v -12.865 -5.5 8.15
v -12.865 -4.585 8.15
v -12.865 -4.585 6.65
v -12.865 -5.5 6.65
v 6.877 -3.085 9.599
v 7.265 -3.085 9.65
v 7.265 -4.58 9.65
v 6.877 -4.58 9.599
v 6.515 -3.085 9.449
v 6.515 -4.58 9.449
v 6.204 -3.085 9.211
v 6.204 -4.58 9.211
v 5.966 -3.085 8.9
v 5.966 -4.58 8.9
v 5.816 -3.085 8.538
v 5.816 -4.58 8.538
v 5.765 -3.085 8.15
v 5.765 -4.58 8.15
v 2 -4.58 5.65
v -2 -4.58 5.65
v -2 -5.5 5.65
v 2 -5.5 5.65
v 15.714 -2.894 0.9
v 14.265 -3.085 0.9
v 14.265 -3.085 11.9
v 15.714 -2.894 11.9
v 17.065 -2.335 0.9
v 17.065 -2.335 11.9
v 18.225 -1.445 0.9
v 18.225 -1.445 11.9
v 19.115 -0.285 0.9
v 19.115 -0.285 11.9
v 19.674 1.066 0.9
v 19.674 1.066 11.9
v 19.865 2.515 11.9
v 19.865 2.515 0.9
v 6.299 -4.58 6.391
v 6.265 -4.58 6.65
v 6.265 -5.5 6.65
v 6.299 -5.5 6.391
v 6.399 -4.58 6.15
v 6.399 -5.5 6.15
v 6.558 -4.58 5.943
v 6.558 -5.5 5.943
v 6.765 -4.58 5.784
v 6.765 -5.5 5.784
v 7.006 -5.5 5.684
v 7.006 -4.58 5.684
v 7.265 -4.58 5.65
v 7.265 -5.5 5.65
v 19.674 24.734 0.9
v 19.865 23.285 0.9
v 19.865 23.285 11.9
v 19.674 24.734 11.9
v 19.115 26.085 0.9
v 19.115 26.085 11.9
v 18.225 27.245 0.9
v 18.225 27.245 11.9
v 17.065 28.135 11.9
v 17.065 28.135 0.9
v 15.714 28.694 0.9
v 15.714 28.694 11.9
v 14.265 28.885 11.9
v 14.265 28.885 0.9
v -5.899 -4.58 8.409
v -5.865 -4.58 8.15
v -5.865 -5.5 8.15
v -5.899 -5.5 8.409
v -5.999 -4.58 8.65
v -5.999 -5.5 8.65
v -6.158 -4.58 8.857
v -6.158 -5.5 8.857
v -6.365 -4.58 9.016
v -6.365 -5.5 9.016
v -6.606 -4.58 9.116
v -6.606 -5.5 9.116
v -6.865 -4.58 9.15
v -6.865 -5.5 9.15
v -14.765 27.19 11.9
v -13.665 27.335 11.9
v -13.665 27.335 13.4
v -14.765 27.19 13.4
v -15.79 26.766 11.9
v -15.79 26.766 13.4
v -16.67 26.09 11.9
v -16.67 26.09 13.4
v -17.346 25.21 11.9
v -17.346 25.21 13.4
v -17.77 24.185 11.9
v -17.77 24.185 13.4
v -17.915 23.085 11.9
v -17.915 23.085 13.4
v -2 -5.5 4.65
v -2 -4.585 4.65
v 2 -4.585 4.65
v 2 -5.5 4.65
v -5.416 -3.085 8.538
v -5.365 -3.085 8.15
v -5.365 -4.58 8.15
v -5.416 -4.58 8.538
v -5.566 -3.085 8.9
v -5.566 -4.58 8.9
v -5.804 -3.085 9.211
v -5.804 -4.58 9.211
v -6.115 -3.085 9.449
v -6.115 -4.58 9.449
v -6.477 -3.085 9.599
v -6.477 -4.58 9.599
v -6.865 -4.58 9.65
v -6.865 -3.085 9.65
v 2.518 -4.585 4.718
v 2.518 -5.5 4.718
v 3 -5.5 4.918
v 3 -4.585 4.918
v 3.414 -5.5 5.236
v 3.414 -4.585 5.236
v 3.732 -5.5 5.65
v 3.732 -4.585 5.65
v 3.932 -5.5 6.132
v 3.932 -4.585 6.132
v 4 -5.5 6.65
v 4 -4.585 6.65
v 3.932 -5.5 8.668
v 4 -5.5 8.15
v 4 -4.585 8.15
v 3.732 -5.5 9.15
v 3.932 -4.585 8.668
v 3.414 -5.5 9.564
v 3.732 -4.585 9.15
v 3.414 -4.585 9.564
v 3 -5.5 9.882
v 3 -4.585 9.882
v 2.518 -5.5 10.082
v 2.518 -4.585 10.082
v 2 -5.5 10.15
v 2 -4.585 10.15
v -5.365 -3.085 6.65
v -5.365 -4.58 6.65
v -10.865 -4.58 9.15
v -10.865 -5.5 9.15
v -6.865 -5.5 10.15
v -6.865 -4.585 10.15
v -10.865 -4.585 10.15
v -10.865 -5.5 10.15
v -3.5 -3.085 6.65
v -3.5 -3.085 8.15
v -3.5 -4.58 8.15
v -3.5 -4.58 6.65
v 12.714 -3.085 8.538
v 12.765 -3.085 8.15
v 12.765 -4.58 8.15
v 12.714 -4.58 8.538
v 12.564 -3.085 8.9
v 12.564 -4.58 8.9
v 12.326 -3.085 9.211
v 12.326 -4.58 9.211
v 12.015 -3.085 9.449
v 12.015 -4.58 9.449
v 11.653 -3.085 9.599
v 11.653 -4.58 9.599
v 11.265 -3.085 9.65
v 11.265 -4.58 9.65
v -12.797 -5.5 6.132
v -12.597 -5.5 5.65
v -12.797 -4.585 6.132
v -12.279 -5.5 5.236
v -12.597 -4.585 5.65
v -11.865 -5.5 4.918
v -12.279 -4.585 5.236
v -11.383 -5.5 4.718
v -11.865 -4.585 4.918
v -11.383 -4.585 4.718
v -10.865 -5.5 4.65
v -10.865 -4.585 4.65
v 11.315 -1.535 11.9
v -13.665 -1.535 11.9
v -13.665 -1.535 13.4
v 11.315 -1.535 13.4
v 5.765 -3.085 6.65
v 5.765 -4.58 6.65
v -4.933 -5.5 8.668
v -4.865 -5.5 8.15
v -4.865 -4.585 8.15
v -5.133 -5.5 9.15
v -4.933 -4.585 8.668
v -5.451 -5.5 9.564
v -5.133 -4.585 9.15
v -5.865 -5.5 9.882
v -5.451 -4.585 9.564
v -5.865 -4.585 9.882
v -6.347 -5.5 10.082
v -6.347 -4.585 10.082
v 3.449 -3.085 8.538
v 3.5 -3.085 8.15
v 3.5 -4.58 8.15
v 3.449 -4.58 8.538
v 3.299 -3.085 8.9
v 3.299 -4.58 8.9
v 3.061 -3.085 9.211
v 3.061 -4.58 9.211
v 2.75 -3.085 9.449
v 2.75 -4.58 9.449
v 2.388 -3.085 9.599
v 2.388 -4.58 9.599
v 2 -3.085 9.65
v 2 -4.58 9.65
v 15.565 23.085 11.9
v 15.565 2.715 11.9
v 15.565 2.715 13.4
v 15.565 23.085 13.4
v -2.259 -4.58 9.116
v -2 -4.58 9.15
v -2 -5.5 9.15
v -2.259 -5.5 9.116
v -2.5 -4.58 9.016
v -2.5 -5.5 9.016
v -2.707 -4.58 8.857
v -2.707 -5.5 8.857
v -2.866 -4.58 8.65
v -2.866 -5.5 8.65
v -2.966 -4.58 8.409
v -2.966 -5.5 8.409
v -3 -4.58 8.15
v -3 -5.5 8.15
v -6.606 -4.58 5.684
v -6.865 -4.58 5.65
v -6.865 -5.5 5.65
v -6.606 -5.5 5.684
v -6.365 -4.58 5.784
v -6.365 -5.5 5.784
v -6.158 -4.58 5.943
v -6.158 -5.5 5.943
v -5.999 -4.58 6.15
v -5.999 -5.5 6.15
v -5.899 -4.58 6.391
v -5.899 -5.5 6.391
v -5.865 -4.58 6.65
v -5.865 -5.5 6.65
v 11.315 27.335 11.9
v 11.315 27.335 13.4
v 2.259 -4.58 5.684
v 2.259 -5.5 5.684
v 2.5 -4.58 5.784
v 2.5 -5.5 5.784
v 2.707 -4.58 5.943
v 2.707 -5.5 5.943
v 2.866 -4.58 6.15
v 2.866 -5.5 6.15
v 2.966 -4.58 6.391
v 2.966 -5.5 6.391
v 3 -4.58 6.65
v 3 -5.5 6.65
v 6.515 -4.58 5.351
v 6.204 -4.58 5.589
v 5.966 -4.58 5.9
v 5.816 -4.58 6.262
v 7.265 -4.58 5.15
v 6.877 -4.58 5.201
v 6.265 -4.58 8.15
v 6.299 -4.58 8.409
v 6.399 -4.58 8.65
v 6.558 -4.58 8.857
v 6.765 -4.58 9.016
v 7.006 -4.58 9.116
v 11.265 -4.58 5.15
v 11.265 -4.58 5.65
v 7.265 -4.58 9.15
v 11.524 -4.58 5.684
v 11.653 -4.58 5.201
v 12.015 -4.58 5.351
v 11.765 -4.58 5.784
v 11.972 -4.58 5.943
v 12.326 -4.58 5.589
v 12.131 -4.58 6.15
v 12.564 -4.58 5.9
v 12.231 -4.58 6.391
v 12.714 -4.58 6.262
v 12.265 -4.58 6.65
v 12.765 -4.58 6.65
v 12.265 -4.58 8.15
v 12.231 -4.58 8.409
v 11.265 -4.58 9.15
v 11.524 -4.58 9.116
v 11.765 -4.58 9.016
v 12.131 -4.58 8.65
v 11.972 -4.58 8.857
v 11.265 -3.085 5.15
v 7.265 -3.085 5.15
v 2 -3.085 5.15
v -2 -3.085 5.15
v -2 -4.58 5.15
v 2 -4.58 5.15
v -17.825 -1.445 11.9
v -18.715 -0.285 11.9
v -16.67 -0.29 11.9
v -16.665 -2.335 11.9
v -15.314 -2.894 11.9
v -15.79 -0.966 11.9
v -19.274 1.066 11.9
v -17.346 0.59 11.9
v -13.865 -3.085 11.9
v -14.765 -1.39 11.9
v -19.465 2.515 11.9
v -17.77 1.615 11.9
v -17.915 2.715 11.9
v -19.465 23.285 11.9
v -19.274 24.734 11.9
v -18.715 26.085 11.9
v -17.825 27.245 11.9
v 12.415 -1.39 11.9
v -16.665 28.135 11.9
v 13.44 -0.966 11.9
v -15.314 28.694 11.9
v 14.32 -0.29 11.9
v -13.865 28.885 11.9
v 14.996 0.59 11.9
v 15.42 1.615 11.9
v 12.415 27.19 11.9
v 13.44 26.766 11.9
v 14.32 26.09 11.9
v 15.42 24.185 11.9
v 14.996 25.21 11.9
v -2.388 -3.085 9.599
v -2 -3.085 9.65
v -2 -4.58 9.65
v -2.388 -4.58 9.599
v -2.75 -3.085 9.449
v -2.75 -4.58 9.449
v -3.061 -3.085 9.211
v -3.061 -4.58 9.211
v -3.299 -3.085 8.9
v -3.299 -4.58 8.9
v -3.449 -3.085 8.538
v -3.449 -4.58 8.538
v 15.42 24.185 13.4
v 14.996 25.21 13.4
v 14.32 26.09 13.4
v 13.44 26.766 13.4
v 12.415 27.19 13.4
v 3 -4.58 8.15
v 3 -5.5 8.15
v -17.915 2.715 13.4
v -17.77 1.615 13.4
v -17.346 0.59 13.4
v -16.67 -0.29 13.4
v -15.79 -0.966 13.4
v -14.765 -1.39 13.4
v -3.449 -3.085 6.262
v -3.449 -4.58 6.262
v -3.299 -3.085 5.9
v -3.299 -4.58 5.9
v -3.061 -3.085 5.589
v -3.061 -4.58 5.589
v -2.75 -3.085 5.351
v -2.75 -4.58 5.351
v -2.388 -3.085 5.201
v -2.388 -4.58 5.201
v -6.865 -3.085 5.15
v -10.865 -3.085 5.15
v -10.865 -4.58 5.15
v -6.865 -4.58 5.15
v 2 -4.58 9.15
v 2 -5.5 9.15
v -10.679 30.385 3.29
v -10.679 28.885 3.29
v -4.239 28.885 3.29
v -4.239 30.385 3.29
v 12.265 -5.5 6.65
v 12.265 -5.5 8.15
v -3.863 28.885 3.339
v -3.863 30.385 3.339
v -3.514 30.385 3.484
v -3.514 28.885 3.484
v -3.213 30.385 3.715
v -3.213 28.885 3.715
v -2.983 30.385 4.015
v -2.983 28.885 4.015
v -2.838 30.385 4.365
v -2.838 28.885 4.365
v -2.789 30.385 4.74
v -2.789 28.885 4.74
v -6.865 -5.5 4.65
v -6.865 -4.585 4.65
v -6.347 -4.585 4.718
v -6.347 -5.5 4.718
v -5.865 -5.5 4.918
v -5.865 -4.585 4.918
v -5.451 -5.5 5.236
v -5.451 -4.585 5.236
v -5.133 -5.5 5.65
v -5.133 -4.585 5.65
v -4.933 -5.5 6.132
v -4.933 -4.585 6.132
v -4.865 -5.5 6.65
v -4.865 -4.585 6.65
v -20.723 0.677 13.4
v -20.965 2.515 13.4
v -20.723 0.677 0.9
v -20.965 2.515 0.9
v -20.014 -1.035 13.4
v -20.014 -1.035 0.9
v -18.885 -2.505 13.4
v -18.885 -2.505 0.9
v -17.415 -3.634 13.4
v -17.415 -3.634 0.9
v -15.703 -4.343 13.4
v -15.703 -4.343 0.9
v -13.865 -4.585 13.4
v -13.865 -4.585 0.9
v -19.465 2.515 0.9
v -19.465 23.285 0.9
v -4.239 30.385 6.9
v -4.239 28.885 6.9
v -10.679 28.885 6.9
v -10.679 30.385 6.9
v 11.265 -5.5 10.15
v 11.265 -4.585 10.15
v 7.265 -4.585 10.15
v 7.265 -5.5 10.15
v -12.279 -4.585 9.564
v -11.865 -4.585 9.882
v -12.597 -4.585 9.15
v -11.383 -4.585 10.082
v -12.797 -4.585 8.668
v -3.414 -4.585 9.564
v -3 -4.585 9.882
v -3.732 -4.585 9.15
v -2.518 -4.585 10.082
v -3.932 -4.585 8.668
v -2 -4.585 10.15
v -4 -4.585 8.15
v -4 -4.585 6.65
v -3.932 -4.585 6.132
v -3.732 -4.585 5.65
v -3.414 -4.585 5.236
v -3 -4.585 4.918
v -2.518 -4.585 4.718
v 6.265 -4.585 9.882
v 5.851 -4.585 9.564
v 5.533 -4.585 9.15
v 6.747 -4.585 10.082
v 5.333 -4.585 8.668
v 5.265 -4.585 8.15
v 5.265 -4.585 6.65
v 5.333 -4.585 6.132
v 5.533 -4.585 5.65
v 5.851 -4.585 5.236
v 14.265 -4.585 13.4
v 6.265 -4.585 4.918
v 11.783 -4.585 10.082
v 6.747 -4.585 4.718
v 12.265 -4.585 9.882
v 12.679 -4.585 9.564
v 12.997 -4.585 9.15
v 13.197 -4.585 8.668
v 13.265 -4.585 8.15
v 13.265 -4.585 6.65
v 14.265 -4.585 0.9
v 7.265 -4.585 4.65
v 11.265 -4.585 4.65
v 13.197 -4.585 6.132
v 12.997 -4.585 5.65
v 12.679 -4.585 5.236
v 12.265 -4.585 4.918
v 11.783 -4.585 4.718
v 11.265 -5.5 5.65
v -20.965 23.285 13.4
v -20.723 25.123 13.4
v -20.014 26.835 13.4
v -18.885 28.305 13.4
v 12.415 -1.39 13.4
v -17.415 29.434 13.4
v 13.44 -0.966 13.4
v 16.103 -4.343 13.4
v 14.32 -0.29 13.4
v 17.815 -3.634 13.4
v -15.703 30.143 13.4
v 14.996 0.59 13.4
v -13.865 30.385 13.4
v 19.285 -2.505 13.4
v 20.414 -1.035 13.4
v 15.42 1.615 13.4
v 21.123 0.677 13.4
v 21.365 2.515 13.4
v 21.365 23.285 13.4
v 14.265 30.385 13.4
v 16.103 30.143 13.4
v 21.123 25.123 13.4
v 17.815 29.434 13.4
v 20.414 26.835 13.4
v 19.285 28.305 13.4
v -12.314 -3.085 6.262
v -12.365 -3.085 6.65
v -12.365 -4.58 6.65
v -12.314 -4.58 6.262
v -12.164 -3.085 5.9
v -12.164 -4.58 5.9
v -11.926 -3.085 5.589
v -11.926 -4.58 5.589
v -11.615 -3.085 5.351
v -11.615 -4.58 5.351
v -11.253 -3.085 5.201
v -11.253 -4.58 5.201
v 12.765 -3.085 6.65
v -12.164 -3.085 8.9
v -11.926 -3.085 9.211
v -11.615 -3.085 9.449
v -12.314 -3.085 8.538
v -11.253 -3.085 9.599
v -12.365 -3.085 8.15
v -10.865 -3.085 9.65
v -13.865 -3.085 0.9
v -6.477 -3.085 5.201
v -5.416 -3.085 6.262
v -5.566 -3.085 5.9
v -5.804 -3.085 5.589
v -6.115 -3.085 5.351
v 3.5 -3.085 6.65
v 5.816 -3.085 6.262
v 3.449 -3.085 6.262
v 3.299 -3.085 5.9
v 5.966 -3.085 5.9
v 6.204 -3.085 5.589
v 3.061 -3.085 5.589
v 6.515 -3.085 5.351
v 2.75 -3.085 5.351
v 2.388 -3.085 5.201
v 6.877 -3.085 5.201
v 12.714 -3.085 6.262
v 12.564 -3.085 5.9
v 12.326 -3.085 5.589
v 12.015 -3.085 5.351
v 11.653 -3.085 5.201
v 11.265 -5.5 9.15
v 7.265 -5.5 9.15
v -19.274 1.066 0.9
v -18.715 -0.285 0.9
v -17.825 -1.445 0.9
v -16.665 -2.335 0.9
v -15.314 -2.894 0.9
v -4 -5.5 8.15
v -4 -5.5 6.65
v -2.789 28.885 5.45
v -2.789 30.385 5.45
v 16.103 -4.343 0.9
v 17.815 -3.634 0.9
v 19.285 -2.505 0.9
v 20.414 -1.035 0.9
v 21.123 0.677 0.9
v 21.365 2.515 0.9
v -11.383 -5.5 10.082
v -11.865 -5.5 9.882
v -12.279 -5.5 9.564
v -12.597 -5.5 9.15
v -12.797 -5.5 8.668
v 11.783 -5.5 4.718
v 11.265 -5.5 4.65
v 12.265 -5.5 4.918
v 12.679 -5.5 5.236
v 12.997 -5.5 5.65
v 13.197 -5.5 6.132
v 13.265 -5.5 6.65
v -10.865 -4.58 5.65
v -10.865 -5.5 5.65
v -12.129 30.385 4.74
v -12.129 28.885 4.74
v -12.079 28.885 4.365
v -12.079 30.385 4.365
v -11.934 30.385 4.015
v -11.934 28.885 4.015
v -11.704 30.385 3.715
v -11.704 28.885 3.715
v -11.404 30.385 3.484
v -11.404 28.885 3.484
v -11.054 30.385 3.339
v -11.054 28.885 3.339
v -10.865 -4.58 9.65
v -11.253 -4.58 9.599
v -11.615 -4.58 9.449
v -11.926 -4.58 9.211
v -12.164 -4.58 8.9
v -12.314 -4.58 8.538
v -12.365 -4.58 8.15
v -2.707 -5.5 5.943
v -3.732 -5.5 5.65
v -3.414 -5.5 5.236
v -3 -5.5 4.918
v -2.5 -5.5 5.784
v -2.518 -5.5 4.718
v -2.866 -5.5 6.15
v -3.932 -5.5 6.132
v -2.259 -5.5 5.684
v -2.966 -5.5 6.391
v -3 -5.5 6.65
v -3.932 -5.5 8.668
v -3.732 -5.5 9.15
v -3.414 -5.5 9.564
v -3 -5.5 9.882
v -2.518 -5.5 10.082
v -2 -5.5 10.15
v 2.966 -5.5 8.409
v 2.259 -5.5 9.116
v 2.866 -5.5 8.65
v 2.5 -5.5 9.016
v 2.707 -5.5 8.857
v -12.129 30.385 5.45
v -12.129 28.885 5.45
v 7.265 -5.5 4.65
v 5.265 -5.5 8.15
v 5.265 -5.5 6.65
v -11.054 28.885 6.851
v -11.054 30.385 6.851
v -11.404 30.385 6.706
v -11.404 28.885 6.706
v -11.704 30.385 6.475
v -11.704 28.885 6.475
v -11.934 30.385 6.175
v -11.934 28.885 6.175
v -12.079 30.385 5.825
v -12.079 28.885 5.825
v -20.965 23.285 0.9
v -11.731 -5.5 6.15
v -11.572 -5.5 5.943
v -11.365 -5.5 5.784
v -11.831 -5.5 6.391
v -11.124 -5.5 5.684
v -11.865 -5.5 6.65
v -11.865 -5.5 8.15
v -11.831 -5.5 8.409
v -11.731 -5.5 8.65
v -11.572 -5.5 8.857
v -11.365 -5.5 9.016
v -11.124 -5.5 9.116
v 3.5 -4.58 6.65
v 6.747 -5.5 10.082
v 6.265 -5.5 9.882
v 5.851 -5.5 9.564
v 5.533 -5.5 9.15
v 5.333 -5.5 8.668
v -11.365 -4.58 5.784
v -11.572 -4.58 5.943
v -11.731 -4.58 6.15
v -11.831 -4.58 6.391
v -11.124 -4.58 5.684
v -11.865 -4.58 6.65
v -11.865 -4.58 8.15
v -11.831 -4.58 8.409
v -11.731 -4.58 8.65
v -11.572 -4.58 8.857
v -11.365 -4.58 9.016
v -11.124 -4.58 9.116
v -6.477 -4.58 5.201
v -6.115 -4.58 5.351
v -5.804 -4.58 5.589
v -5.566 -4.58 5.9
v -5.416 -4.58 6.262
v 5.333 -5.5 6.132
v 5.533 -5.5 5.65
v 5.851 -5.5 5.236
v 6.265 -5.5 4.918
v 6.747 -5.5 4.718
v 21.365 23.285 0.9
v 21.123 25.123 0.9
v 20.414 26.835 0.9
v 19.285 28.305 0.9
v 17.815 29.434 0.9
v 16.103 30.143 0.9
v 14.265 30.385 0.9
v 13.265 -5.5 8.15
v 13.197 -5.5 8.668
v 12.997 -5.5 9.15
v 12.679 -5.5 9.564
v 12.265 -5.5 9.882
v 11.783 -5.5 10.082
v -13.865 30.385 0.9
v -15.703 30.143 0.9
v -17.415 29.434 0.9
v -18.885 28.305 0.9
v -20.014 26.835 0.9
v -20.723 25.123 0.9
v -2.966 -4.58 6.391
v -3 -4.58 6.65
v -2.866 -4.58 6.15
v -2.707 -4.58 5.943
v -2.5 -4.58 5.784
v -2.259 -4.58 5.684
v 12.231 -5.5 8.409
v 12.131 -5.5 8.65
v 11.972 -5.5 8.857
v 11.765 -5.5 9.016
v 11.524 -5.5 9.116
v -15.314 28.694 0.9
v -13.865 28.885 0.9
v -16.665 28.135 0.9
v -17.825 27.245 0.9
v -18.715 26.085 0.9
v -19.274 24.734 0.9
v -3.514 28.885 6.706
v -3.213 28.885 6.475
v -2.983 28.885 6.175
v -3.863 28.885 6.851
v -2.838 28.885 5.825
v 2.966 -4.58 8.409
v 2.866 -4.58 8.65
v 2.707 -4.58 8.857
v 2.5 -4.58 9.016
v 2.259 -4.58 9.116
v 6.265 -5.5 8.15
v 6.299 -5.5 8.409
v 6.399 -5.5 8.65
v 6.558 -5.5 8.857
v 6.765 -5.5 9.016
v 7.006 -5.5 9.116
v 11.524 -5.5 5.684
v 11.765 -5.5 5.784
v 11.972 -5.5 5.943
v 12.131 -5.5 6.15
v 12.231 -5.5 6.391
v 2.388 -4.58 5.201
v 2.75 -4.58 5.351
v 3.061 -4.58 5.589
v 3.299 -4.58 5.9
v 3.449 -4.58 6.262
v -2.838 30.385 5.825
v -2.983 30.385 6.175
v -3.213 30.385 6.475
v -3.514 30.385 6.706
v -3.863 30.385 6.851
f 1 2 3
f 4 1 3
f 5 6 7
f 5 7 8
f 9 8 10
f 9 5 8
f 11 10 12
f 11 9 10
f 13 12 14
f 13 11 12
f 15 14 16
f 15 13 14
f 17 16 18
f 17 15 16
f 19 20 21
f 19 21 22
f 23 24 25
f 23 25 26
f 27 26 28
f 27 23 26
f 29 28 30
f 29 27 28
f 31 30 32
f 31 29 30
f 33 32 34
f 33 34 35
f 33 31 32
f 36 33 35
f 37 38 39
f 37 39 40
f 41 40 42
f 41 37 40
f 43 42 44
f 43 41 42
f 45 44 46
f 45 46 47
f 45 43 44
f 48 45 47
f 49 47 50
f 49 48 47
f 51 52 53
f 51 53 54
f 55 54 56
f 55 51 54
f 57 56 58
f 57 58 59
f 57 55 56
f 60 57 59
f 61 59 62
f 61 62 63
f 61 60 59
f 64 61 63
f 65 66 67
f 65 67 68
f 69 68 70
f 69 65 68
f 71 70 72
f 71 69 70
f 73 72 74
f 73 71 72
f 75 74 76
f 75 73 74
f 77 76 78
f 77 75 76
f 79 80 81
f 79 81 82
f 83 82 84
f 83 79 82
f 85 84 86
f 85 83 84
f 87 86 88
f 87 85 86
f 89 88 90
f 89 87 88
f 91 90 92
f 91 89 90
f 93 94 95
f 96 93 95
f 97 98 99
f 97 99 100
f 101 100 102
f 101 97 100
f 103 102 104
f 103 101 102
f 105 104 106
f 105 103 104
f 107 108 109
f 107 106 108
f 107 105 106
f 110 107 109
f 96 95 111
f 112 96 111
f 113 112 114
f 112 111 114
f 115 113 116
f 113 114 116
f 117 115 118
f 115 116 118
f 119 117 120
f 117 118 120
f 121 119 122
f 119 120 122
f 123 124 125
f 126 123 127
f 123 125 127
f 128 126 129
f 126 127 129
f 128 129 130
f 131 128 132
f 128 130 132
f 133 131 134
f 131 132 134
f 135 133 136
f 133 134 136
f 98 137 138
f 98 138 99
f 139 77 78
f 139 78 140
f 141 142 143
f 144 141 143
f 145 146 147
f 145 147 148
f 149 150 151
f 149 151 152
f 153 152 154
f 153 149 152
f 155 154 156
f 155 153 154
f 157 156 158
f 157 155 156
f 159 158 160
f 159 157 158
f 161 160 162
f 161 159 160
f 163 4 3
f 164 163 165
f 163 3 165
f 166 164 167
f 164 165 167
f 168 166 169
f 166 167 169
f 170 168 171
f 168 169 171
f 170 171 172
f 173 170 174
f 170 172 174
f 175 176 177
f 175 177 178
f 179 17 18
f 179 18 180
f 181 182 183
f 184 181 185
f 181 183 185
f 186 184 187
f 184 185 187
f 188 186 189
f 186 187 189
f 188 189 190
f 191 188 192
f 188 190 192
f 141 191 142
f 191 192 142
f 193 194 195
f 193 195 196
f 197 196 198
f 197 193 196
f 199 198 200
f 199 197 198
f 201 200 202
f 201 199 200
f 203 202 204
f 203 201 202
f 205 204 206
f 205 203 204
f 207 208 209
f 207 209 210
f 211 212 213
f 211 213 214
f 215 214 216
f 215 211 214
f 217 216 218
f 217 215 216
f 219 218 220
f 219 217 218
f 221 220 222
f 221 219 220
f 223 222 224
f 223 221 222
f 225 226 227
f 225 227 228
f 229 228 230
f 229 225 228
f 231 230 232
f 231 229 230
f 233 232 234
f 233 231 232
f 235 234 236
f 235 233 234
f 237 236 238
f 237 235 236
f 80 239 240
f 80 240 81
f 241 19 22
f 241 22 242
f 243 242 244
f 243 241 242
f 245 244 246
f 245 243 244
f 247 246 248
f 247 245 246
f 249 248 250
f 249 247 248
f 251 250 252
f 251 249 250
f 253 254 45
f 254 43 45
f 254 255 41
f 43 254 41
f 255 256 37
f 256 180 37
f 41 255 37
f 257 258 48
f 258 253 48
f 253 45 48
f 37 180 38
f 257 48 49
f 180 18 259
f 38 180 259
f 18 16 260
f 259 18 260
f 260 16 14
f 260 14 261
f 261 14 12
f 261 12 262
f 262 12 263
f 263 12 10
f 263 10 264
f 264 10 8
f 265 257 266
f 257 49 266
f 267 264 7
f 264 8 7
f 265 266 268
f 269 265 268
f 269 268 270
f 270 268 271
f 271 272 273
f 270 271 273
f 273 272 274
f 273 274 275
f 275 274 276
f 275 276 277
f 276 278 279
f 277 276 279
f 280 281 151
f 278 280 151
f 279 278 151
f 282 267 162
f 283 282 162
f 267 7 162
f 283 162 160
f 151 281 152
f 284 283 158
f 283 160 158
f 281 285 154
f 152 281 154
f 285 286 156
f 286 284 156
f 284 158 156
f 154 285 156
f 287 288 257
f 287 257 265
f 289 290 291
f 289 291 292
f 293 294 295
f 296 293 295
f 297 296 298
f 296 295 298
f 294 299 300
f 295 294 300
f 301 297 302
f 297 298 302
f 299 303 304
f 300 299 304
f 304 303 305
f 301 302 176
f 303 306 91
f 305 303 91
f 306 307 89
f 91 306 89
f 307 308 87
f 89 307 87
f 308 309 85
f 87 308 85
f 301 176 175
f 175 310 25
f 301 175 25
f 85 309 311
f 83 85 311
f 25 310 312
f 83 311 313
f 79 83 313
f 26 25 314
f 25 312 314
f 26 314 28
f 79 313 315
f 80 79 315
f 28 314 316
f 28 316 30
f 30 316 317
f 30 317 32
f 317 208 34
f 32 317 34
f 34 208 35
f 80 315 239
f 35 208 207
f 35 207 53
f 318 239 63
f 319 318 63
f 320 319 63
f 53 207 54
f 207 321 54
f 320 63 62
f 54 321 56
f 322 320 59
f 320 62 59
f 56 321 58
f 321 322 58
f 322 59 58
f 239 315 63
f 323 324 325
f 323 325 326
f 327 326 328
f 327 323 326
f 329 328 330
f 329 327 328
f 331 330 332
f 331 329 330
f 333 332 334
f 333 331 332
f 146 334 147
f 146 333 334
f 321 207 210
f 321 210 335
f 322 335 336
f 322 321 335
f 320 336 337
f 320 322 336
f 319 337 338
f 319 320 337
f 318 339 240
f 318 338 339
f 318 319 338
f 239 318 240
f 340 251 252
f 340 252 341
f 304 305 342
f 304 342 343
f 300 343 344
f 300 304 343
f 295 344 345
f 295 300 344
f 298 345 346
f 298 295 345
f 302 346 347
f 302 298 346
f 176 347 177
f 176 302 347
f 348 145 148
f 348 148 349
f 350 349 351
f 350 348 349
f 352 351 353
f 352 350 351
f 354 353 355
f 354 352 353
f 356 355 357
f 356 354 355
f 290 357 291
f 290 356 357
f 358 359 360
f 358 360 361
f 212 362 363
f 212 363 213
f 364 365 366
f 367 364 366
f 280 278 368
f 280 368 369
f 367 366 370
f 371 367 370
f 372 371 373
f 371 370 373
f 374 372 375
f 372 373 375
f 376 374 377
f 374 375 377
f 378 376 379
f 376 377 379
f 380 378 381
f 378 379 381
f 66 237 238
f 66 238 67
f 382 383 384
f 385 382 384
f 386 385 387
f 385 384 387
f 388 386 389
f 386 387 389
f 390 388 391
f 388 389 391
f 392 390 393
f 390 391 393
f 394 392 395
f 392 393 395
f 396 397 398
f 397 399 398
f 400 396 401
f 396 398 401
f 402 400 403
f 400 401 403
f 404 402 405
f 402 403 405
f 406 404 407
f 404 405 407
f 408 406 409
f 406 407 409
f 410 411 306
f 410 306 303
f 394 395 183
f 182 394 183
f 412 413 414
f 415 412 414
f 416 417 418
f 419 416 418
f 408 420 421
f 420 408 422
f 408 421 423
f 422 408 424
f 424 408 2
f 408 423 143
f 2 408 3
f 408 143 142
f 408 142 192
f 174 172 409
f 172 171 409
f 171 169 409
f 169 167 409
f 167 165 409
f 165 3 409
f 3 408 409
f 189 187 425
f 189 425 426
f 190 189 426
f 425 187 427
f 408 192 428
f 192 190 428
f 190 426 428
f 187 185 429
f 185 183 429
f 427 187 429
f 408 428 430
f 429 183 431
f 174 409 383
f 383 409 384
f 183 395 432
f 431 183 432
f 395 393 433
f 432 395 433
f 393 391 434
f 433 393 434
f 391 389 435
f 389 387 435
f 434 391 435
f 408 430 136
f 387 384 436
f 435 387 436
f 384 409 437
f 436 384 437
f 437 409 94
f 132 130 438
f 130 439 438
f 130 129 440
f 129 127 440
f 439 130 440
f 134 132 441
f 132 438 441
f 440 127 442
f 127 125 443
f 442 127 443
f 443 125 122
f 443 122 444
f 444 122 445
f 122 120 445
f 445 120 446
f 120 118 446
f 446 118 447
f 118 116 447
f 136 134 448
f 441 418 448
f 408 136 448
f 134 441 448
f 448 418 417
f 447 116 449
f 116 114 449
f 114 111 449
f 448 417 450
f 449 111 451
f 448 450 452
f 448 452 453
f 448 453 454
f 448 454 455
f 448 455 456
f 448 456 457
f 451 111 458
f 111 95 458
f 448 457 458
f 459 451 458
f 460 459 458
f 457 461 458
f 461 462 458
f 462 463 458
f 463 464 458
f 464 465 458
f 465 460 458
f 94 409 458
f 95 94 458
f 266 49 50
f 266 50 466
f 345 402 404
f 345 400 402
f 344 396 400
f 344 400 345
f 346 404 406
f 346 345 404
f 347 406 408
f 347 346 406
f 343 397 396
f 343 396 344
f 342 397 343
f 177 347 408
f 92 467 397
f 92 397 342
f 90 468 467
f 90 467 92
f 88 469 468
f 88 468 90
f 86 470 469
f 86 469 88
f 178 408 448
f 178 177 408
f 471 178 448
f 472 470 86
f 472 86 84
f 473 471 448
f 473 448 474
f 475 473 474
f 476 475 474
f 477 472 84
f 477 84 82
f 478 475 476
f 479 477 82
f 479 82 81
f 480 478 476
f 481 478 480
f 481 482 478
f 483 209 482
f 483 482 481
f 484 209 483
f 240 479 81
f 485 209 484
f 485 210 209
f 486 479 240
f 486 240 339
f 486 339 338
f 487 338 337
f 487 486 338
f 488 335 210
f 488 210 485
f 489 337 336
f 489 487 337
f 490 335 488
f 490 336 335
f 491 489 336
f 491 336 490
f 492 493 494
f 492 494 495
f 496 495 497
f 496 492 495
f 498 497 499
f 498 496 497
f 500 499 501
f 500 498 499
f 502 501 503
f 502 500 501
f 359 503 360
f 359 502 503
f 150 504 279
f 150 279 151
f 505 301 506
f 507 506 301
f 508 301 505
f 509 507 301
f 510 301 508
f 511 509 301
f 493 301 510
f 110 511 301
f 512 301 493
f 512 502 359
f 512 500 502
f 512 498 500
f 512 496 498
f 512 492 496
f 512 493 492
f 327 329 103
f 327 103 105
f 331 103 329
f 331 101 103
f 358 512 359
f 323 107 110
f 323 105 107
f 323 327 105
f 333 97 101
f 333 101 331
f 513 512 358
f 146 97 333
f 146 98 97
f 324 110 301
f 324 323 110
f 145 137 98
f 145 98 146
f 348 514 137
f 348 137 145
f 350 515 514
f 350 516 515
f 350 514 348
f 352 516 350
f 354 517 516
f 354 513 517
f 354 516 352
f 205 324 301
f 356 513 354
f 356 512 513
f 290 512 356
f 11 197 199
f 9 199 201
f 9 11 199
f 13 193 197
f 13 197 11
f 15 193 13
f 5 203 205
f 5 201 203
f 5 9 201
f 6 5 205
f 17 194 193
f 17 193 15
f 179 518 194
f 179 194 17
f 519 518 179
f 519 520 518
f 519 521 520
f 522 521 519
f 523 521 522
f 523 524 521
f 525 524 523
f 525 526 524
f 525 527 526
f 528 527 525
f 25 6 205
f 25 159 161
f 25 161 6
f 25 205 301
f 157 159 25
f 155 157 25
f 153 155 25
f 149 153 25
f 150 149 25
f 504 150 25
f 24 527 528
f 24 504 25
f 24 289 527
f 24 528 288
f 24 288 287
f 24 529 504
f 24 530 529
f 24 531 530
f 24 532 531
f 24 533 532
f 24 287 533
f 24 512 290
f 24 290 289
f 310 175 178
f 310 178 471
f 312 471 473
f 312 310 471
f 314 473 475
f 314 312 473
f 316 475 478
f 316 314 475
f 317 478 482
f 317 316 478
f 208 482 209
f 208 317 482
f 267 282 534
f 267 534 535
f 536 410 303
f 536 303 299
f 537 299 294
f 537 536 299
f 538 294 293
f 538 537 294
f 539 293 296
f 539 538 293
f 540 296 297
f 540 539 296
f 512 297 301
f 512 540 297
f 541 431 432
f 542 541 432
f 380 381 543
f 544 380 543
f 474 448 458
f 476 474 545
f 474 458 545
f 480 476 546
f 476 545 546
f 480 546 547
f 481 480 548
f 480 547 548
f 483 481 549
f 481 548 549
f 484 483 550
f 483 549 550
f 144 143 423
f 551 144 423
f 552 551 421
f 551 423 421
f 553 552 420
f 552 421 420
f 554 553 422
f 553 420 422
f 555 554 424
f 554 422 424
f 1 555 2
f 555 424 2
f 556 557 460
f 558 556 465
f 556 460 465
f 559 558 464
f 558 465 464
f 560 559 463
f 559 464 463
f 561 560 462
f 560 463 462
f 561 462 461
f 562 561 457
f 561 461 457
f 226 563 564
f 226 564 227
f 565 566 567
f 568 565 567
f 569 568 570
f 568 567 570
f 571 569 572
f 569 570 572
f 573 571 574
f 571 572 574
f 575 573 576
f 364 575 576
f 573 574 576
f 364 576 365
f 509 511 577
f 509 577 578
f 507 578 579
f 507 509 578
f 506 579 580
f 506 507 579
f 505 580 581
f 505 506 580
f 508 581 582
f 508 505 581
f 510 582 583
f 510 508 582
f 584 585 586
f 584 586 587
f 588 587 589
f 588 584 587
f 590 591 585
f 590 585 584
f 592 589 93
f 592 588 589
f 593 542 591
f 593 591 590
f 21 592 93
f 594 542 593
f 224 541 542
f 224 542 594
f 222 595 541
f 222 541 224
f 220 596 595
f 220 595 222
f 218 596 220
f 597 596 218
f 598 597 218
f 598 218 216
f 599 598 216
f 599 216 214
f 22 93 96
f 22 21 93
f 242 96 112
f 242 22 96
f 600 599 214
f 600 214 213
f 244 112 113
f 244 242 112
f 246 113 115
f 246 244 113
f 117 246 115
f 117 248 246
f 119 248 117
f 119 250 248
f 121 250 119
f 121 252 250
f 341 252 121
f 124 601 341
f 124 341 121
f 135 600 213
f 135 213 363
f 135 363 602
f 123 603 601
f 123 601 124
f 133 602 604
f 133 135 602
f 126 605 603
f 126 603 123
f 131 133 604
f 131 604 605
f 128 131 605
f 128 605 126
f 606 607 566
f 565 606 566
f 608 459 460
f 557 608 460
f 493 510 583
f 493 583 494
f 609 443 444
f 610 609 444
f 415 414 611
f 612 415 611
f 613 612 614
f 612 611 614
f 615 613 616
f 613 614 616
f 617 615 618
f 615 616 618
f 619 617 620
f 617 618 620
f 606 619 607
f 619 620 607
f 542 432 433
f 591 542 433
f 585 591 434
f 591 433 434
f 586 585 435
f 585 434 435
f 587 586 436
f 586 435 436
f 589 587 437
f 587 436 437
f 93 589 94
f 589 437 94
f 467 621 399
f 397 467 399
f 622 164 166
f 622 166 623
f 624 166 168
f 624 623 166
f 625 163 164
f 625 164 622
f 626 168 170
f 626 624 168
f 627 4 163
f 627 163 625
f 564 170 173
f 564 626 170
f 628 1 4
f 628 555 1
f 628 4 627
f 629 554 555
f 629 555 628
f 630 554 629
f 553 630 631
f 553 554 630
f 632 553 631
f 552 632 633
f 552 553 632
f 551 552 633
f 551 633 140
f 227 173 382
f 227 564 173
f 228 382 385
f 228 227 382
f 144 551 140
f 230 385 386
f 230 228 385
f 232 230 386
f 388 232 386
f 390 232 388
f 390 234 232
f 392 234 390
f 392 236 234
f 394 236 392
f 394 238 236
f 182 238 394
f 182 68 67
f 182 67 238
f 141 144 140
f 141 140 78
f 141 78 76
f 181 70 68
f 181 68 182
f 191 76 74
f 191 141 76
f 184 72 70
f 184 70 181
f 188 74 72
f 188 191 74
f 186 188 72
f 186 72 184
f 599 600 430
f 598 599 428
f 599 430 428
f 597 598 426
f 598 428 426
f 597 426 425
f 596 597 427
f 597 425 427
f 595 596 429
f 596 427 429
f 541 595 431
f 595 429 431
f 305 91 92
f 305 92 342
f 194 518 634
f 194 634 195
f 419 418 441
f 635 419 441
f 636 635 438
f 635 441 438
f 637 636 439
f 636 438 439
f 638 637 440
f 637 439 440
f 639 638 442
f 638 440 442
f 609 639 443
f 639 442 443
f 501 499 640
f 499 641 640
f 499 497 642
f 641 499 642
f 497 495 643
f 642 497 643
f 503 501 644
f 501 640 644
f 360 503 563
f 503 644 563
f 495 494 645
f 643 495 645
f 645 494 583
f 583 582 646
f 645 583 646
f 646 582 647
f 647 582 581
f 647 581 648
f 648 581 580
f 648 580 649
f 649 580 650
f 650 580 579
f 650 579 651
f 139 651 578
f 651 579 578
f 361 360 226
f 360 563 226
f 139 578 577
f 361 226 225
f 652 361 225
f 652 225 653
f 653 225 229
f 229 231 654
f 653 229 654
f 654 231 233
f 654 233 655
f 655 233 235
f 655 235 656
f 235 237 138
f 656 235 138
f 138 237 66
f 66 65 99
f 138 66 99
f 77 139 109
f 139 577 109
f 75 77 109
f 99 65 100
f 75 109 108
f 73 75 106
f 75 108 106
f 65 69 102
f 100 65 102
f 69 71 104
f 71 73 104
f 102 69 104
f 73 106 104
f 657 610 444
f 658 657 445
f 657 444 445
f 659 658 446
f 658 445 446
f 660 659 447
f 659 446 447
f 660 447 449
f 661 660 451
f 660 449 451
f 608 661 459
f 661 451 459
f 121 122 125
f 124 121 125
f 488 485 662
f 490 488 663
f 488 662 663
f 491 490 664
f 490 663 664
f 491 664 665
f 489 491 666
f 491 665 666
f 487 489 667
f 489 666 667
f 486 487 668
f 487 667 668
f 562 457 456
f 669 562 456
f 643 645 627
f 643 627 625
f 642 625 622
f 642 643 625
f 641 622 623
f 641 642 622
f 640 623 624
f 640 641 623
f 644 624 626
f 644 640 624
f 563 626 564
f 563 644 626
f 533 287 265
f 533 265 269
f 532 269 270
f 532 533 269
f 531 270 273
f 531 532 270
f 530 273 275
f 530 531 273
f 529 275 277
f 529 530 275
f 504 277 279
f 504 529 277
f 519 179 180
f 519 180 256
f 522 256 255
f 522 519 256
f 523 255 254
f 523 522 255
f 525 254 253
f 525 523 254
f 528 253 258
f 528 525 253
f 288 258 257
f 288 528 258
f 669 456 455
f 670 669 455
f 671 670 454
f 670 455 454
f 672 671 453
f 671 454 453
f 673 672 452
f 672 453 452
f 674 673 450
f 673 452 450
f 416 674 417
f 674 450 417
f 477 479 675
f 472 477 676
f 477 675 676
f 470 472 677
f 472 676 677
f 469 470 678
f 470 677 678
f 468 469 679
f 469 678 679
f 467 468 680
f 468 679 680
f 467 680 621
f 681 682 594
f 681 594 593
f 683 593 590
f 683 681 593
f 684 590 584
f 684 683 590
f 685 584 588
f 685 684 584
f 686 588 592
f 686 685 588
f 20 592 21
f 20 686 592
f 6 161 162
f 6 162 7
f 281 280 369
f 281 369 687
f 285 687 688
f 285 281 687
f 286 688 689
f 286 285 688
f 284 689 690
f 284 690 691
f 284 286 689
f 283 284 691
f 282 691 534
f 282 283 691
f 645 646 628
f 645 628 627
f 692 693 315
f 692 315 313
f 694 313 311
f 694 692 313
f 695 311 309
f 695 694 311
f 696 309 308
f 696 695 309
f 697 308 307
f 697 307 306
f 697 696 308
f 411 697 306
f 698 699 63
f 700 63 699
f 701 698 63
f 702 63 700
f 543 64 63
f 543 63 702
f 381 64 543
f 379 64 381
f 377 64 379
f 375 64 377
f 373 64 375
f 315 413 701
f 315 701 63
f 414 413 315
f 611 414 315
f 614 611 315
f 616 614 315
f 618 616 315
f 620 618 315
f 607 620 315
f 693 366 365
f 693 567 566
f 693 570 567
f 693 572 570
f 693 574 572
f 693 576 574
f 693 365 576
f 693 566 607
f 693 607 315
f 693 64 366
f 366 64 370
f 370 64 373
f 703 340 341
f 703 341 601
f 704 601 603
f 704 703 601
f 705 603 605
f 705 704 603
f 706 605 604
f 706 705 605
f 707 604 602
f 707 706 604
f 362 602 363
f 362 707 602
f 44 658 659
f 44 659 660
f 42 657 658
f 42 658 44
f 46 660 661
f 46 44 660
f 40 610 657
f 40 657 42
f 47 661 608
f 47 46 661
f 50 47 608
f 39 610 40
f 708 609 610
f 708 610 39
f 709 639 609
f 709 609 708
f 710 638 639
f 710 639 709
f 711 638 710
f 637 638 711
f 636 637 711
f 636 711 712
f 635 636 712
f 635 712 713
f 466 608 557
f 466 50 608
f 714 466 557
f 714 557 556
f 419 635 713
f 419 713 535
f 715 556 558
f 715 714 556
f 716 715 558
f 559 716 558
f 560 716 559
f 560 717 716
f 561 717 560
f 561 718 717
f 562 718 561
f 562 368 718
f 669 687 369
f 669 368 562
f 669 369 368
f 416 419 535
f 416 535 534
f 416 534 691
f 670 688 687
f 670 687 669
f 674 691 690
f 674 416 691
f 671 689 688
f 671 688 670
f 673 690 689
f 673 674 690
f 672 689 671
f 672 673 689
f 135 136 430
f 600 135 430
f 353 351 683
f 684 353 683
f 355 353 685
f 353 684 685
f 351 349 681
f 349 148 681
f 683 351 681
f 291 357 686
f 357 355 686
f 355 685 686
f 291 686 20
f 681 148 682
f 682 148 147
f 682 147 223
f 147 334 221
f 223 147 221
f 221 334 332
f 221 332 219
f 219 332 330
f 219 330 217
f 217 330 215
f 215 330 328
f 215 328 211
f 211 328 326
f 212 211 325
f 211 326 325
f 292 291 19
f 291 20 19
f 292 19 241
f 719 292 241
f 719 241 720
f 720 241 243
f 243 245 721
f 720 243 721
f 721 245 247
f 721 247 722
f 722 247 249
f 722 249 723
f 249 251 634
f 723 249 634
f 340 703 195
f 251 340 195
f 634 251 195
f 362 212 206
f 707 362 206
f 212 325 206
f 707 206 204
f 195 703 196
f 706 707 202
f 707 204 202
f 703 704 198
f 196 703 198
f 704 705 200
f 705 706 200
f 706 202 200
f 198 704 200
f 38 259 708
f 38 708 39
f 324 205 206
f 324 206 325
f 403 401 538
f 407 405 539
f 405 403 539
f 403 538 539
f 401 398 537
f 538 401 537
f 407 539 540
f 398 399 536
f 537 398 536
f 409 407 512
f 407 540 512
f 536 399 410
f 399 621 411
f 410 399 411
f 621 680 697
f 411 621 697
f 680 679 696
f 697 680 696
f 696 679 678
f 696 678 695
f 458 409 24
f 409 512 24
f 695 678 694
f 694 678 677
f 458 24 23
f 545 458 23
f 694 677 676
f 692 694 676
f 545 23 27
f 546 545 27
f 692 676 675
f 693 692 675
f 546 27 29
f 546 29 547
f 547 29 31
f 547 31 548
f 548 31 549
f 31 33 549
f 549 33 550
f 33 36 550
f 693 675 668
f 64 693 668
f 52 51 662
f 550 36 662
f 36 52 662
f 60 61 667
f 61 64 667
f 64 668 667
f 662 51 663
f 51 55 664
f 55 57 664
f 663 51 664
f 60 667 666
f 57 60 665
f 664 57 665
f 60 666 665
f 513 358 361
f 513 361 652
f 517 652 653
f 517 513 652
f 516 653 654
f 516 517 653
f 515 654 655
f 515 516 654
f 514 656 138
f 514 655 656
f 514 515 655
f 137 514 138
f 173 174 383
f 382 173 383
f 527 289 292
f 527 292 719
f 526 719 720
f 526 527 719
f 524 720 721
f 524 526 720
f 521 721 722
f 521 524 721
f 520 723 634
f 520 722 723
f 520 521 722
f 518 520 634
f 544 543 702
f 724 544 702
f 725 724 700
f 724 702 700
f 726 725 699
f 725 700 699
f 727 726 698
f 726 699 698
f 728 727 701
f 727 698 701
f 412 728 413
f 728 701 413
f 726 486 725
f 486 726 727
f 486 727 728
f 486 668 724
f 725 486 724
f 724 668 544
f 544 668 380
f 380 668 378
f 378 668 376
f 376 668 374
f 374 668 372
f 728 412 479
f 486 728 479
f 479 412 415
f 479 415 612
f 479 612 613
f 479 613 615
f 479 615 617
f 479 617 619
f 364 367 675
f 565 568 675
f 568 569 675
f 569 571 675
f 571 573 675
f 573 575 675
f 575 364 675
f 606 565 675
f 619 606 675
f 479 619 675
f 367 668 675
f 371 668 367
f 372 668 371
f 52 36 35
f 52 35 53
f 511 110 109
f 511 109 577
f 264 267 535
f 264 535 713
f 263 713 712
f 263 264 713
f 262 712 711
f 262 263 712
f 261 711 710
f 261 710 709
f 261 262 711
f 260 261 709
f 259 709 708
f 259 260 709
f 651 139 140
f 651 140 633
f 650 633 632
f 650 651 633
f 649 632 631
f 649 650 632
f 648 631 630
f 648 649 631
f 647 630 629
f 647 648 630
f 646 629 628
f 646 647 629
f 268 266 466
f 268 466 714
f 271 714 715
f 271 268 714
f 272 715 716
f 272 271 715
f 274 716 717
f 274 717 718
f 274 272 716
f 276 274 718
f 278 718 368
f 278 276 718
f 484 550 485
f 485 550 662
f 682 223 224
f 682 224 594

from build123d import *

# Parameters (mm, degrees)
PAD002_DEPTH    = 11
THICKNESS001_T  = 1.5
POCKET006_DEPTH = 20
POCKET007_DEPTH = 32
POCKET009_DEPTH = 5
POCKET014_DEPTH = 5
PAD012_START    = 4.58
PAD012_DEPTH    = 0.92


with BuildPart() as part:
    # Sketch012 → Pad002 (new body)
    with BuildSketch(Plane.XY):
        with BuildLine():
            Line((-19.464986, 23.284984), (-19.464986, 2.515016))
            ThreePointArc((-19.464986, 2.515016), (-17.82478, -1.444793), (-13.864971, -3.085))
            Line((-13.864971, -3.085), (14.264998, -3.085))
            ThreePointArc((14.264998, -3.085), (18.224807, -1.444793), (19.865014, 2.515016))
            Line((19.865014, 2.515016), (19.865014, 23.284984))
            ThreePointArc((19.865014, 23.284984), (18.224807, 27.244793), (14.264998, 28.885))
            Line((14.264998, 28.885), (-13.864971, 28.885))
            ThreePointArc((-13.864971, 28.885), (-17.82478, 27.244793), (-19.464986, 23.284984))
        make_face()
    extrude(amount=PAD002_DEPTH)

    # Thickness001
    thickness001_openings = [part.faces().sort_by_distance(p)[0] for p in [
        (0.200014, 12.9, 0),
    ]]
    offset(amount=THICKNESS001_T, openings=thickness001_openings, kind=Kind.INTERSECTION)

    # Sketch013 → Pocket006 (cut)
    with BuildSketch(Plane.XY):
        with BuildLine():
            Line((-13.664986, -1.535), (11.315014, -1.535))
            ThreePointArc((11.315014, -1.535), (14.320217, -0.290204), (15.565014, 2.715))
            Line((15.565014, 2.715), (15.565014, 23.085))
            ThreePointArc((15.565014, 23.085), (14.320217, 26.090204), (11.315014, 27.335))
            Line((11.315014, 27.335), (-13.664986, 27.335))
            ThreePointArc((-13.664986, 27.335), (-16.67019, 26.090204), (-17.914986, 23.085))
            Line((-17.914986, 23.085), (-17.914986, 2.715))
            ThreePointArc((-17.914986, 2.715), (-16.67019, -0.290204), (-13.664986, -1.535))
        make_face()
    extrude(amount=POCKET006_DEPTH, mode=Mode.SUBTRACT)

    # Sketch018 → Pocket007 (cut)
    with BuildSketch(Plane.XZ):
        with BuildLine():
            Line((-10.6786, 2.39), (-4.2386, 2.39))
            ThreePointArc((-4.2386, 2.39), (-3.213295, 2.814695), (-2.7886, 3.84))
            Line((-2.7886, 3.84), (-2.7886, 4.55))
            ThreePointArc((-2.7886, 4.55), (-3.213295, 5.575305), (-4.2386, 6))
            Line((-4.2386, 6), (-10.6786, 6))
            ThreePointArc((-10.6786, 6), (-11.703905, 5.575305), (-12.1286, 4.55))
            Line((-12.1286, 4.55), (-12.1286, 3.84))
            ThreePointArc((-12.1286, 3.84), (-11.703905, 2.814695), (-10.6786, 2.39))
        make_face()
    extrude(amount=-POCKET007_DEPTH, mode=Mode.SUBTRACT)

    # Sketch022 → Pocket009 (cut)
    with BuildSketch(Plane.XZ):
        with BuildLine():
            Line((-11.864971, 7.25), (-11.864971, 5.75))
            ThreePointArc((-11.864971, 5.75), (-11.572077, 5.042893), (-10.864971, 4.75))
            Line((-10.864971, 4.75), (-6.864971, 4.75))
            ThreePointArc((-6.864971, 4.75), (-6.157864, 5.042893), (-5.864971, 5.75))
            Line((-5.864971, 5.75), (-5.864971, 7.25))
            ThreePointArc((-5.864971, 7.25), (-6.157864, 7.957107), (-6.864971, 8.25))
            Line((-6.864971, 8.25), (-10.864971, 8.25))
            ThreePointArc((-10.864971, 8.25), (-11.572077, 7.957107), (-11.864971, 7.25))
        make_face()
        with BuildLine():
            Line((-3, 7.25), (-3, 5.75))
            ThreePointArc((-3, 5.75), (-2.707107, 5.042893), (-2, 4.75))
            Line((-2, 4.75), (2, 4.75))
            ThreePointArc((2, 4.75), (2.707107, 5.042893), (3, 5.75))
            Line((3, 5.75), (3, 7.25))
            ThreePointArc((3, 7.25), (2.707107, 7.957107), (2, 8.25))
            Line((2, 8.25), (-2, 8.25))
            ThreePointArc((-2, 8.25), (-2.707107, 7.957107), (-3, 7.25))
        make_face()
        with BuildLine():
            Line((6.264998, 7.25), (6.264998, 5.75))
            ThreePointArc((6.264998, 5.75), (6.557891, 5.042893), (7.264998, 4.75))
            Line((7.264998, 4.75), (11.264998, 4.75))
            ThreePointArc((11.264998, 4.75), (11.972105, 5.042893), (12.264998, 5.75))
            Line((12.264998, 5.75), (12.264998, 7.25))
            ThreePointArc((12.264998, 7.25), (11.972105, 7.957107), (11.264998, 8.25))
            Line((11.264998, 8.25), (7.264998, 8.25))
            ThreePointArc((7.264998, 8.25), (6.557891, 7.957107), (6.264998, 7.25))
        make_face()
    extrude(amount=POCKET009_DEPTH, mode=Mode.SUBTRACT)

    # Sketch030 → Pocket014 (cut)
    with BuildSketch(Plane.XZ):
        with BuildLine():
            Line((11.264998, 8.75), (7.264998, 8.75))
            ThreePointArc((7.264998, 8.75), (6.204338, 8.31066), (5.764998, 7.25))
            Line((5.764998, 7.25), (5.764998, 5.75))
            ThreePointArc((5.764998, 5.75), (6.204338, 4.68934), (7.264998, 4.25))
            Line((7.264998, 4.25), (11.264998, 4.25))
            ThreePointArc((11.264998, 4.25), (12.325658, 4.68934), (12.764998, 5.75))
            Line((12.764998, 5.75), (12.764998, 7.25))
            ThreePointArc((12.764998, 7.25), (12.325658, 8.31066), (11.264998, 8.75))
        make_face()
        with BuildLine():
            Line((-12.364971, 7.25), (-12.364971, 5.75))
            ThreePointArc((-12.364971, 5.75), (-11.925631, 4.68934), (-10.864971, 4.25))
            Line((-10.864971, 4.25), (-6.864971, 4.25))
            ThreePointArc((-6.864971, 4.25), (-5.804311, 4.68934), (-5.364971, 5.75))
            Line((-5.364971, 5.75), (-5.364971, 7.25))
            ThreePointArc((-5.364971, 7.25), (-5.804311, 8.31066), (-6.864971, 8.75))
            Line((-6.864971, 8.75), (-10.864971, 8.75))
            ThreePointArc((-10.864971, 8.75), (-11.925631, 8.31066), (-12.364971, 7.25))
        make_face()
        with BuildLine():
            Line((-3.5, 7.25), (-3.5, 5.75))
            ThreePointArc((-3.5, 5.75), (-3.06066, 4.68934), (-2, 4.25))
            Line((-2, 4.25), (2, 4.25))
            ThreePointArc((2, 4.25), (3.06066, 4.68934), (3.5, 5.75))
            Line((3.5, 5.75), (3.5, 7.25))
            ThreePointArc((3.5, 7.25), (3.06066, 8.31066), (2, 8.75))
            Line((2, 8.75), (-2, 8.75))
            ThreePointArc((-2, 8.75), (-3.06066, 8.31066), (-3.5, 7.25))
        make_face()
    extrude(amount=POCKET014_DEPTH, mode=Mode.SUBTRACT)

    # Sketch031 → Pad012 (join)
    with BuildSketch(Plane.XZ.offset(PAD012_START)):
        with BuildLine():
            Line((5.264998, 7.25), (5.264998, 5.75))
            ThreePointArc((5.264998, 5.75), (5.850784, 4.335786), (7.264998, 3.75))
            Line((7.264998, 3.75), (11.264998, 3.75))
            ThreePointArc((11.264998, 3.75), (12.679211, 4.335786), (13.264998, 5.75))
            Line((13.264998, 5.75), (13.264998, 7.25))
            ThreePointArc((13.264998, 7.25), (12.679211, 8.664214), (11.264998, 9.25))
            Line((11.264998, 9.25), (7.264998, 9.25))
            ThreePointArc((7.264998, 9.25), (5.850784, 8.664214), (5.264998, 7.25))
        make_face()
        with BuildLine():
            Line((6.264998, 7.25), (6.264998, 5.75))
            ThreePointArc((6.264998, 5.75), (6.557891, 5.042893), (7.264998, 4.75))
            Line((7.264998, 4.75), (11.264998, 4.75))
            ThreePointArc((11.264998, 4.75), (11.972105, 5.042893), (12.264998, 5.75))
            Line((12.264998, 5.75), (12.264998, 7.25))
            ThreePointArc((12.264998, 7.25), (11.972105, 7.957107), (11.264998, 8.25))
            Line((11.264998, 8.25), (7.264998, 8.25))
            ThreePointArc((7.264998, 8.25), (6.557891, 7.957107), (6.264998, 7.25))
        make_face(mode=Mode.SUBTRACT)
        with BuildLine():
            Line((-12.864971, 7.25), (-12.864971, 5.75))
            ThreePointArc((-12.864971, 5.75), (-12.279184, 4.335786), (-10.864971, 3.75))
            Line((-10.864971, 3.75), (-6.864971, 3.75))
            ThreePointArc((-6.864971, 3.75), (-5.450757, 4.335786), (-4.864971, 5.75))
            Line((-4.864971, 5.75), (-4.864971, 7.25))
            ThreePointArc((-4.864971, 7.25), (-5.450757, 8.664214), (-6.864971, 9.25))
            Line((-6.864971, 9.25), (-10.864971, 9.25))
            ThreePointArc((-10.864971, 9.25), (-12.279184, 8.664214), (-12.864971, 7.25))
        make_face()
        with BuildLine():
            Line((-11.864971, 7.25), (-11.864971, 5.75))
            ThreePointArc((-11.864971, 5.75), (-11.572077, 5.042893), (-10.864971, 4.75))
            Line((-10.864971, 4.75), (-6.864971, 4.75))
            ThreePointArc((-6.864971, 4.75), (-6.157864, 5.042893), (-5.864971, 5.75))
            Line((-5.864971, 5.75), (-5.864971, 7.25))
            ThreePointArc((-5.864971, 7.25), (-6.157864, 7.957107), (-6.864971, 8.25))
            Line((-6.864971, 8.25), (-10.864971, 8.25))
            ThreePointArc((-10.864971, 8.25), (-11.572077, 7.957107), (-11.864971, 7.25))
        make_face(mode=Mode.SUBTRACT)
        with BuildLine():
            Line((-2, 3.75), (2, 3.75))
            ThreePointArc((2, 3.75), (3.414214, 4.335786), (4, 5.75))
            Line((4, 5.75), (4, 7.25))
            ThreePointArc((4, 7.25), (3.414214, 8.664214), (2, 9.25))
            Line((2, 9.25), (-2, 9.25))
            ThreePointArc((-2, 9.25), (-3.414214, 8.664214), (-4, 7.25))
            Line((-4, 7.25), (-4, 5.75))
            ThreePointArc((-4, 5.75), (-3.414214, 4.335786), (-2, 3.75))
        make_face()
        with BuildLine():
            Line((-3, 7.25), (-3, 5.75))
            ThreePointArc((-3, 5.75), (-2.707107, 5.042893), (-2, 4.75))
            Line((-2, 4.75), (2, 4.75))
            ThreePointArc((2, 4.75), (2.707107, 5.042893), (3, 5.75))
            Line((3, 5.75), (3, 7.25))
            ThreePointArc((3, 7.25), (2.707107, 7.957107), (2, 8.25))
            Line((2, 8.25), (-2, 8.25))
            ThreePointArc((-2, 8.25), (-2.707107, 7.957107), (-3, 7.25))
        make_face(mode=Mode.SUBTRACT)
    extrude(amount=PAD012_DEPTH)


with BuildPart() as part_1:
    # Body002 placement: moved
    add(part.part.moved(Location((0, 0, 0.9))))


solid = part_1.part
